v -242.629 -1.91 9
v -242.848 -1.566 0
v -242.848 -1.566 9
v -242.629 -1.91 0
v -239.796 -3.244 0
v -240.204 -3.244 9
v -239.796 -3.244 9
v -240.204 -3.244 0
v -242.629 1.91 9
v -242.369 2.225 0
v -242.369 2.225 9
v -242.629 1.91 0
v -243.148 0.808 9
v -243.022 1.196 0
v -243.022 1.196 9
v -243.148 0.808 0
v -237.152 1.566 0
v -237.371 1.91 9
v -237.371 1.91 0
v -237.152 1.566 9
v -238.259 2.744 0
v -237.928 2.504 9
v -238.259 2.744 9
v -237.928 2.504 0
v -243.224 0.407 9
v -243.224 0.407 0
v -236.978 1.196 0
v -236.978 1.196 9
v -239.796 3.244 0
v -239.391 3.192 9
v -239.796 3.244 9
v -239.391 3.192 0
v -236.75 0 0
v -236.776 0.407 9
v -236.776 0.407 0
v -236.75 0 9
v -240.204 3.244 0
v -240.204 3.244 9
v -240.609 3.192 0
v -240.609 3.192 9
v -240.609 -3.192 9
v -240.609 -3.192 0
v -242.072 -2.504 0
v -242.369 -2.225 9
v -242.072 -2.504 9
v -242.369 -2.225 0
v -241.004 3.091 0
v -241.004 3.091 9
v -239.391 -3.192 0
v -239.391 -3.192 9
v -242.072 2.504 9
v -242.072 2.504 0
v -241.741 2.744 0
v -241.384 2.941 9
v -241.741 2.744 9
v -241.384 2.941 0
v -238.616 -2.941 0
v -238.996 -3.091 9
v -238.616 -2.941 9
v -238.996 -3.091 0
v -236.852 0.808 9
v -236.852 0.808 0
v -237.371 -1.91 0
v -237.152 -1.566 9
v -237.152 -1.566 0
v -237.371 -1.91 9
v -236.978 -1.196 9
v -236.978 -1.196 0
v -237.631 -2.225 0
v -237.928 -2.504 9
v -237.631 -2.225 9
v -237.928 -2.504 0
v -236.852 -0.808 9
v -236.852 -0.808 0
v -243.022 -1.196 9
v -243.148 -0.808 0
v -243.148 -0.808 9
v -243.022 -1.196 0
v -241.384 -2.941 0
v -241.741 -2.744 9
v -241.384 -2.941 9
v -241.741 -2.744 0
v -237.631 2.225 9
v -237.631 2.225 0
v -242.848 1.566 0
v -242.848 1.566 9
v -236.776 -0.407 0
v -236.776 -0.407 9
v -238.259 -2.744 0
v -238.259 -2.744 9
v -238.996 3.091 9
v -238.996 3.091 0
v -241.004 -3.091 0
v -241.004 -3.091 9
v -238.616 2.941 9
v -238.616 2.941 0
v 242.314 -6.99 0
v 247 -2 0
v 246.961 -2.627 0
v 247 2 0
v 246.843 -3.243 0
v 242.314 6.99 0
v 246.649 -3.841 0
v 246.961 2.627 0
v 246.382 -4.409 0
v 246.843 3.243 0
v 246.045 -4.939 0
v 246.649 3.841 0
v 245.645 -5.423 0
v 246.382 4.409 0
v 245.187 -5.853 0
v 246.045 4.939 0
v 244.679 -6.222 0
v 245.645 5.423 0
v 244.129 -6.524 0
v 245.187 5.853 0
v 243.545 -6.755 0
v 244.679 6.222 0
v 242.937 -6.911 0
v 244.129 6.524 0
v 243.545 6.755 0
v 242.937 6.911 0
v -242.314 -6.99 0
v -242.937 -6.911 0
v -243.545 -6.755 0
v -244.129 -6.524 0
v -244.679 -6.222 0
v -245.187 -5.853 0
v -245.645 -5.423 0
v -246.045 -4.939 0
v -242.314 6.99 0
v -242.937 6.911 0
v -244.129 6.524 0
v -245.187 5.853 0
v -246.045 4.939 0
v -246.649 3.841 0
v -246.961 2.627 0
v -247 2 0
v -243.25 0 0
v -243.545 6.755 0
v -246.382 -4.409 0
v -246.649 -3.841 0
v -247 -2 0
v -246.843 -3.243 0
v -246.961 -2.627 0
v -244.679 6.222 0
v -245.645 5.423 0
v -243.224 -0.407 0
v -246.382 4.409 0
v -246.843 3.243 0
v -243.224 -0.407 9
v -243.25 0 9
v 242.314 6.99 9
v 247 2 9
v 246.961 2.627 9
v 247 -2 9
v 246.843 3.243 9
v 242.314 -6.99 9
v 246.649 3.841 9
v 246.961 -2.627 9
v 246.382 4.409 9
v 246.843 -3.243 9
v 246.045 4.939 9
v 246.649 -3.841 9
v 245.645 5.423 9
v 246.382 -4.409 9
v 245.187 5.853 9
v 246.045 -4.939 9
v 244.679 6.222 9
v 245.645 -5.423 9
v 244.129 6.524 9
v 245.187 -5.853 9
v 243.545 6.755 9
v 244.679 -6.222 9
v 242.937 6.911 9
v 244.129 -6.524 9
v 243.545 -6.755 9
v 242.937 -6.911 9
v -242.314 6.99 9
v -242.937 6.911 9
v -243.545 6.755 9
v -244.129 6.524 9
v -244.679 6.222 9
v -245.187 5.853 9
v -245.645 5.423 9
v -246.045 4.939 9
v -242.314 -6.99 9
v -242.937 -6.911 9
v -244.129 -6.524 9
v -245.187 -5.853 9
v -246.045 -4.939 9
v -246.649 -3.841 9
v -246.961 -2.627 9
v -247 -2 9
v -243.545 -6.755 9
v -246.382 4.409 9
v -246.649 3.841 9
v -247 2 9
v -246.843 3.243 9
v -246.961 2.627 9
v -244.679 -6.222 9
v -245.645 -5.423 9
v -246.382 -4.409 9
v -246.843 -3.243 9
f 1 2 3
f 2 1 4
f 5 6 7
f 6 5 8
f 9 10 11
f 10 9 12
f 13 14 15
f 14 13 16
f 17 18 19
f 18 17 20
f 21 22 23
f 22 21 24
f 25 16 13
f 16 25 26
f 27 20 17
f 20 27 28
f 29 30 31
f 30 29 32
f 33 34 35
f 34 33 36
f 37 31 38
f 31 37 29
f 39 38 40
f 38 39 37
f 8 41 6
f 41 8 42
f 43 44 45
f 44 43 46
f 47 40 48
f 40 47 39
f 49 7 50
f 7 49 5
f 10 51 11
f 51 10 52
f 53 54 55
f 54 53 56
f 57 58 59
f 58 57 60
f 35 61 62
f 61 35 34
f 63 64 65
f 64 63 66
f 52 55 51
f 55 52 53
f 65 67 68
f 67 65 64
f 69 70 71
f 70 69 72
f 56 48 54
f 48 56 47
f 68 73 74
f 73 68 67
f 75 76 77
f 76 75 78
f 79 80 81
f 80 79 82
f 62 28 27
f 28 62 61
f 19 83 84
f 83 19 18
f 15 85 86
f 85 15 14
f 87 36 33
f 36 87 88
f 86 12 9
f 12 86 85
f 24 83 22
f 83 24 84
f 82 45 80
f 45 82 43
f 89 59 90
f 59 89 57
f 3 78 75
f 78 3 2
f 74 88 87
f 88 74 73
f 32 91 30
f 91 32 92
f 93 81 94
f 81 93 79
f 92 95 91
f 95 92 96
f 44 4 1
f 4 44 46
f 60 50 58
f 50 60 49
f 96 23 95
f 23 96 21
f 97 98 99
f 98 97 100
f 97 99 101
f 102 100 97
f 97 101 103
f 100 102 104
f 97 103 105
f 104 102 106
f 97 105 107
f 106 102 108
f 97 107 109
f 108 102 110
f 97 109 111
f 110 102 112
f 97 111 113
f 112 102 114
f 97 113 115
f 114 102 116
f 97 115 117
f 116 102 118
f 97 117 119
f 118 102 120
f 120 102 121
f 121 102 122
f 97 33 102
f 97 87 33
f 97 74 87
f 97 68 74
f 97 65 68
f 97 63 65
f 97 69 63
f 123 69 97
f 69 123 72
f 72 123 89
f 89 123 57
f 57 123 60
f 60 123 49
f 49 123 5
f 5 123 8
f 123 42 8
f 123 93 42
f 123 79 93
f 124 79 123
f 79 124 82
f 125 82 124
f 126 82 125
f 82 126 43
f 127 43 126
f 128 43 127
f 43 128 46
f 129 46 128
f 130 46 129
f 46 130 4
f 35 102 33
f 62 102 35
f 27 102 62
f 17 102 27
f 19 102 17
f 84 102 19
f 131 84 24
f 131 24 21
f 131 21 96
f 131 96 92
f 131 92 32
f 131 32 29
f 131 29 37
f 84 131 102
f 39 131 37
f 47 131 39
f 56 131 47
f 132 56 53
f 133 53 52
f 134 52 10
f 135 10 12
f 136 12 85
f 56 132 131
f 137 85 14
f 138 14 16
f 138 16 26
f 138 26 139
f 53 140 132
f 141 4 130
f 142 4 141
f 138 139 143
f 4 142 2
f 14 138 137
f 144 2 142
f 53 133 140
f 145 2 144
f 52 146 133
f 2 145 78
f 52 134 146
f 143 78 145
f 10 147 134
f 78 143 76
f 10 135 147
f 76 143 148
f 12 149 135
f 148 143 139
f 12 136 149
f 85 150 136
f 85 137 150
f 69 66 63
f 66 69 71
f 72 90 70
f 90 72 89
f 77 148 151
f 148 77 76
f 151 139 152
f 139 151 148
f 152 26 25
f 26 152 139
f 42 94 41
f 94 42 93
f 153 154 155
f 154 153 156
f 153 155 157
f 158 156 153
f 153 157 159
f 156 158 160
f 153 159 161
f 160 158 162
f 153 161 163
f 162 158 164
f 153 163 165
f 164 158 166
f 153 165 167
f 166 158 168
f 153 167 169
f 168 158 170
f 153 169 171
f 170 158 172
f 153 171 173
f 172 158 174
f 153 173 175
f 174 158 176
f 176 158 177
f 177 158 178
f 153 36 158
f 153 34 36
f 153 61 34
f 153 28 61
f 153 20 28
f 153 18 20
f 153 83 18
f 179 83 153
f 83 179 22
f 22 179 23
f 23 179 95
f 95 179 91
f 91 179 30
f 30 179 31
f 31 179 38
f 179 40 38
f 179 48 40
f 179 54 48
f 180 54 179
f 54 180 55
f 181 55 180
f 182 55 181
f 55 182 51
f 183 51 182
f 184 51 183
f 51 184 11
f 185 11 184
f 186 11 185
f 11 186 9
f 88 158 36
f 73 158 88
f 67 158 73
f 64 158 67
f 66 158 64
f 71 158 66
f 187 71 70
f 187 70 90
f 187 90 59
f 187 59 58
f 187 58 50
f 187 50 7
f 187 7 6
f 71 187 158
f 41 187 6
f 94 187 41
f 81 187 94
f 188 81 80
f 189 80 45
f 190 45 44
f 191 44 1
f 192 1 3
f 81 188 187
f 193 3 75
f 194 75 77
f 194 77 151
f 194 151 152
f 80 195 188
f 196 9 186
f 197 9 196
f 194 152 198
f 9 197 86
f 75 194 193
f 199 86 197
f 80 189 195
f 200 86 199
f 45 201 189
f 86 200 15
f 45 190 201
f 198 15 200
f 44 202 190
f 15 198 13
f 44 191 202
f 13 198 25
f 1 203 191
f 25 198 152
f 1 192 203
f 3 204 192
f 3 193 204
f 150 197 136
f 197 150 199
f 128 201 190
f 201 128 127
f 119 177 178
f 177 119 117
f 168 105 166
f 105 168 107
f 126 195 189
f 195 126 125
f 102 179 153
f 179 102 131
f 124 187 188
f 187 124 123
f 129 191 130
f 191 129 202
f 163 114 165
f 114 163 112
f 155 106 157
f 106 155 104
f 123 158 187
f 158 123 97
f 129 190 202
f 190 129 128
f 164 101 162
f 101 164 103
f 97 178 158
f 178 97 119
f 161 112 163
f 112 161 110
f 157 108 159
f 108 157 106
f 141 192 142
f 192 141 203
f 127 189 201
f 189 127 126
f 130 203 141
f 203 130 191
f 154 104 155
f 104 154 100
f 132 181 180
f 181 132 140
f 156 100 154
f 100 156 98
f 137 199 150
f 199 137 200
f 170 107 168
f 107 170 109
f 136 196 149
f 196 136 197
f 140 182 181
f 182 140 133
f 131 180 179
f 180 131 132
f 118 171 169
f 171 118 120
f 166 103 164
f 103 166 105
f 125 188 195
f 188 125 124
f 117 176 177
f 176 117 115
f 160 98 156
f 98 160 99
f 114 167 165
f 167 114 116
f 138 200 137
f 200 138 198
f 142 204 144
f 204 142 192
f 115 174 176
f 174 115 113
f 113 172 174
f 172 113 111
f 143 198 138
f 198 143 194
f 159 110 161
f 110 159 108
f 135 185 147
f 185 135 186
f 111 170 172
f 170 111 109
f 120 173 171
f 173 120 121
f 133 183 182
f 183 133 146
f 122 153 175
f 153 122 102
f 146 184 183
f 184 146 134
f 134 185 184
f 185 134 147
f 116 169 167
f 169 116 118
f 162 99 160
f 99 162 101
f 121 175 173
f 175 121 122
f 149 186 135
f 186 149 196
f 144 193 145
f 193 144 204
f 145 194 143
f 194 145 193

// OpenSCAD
$fn = 50;


difference() {
	union() {
		hull() {
			translate(v = [-242.0000000000, 2.0000000000, 0]) {
				cylinder(h = 9, r = 5);
			}
			translate(v = [242.0000000000, 2.0000000000, 0]) {
				cylinder(h = 9, r = 5);
			}
			translate(v = [-242.0000000000, -2.0000000000, 0]) {
				cylinder(h = 9, r = 5);
			}
			translate(v = [242.0000000000, -2.0000000000, 0]) {
				cylinder(h = 9, r = 5);
			}
		}
	}
	union() {
		translate(v = [-240.0000000000, 0.0000000000, 0]) {
			cylinder(h = 9, r = 3.2500000000);
		}
		translate(v = [-240.0000000000, 0.0000000000, 0]) {
			cylinder(h = 9, r = 1.8000000000);
		}
		translate(v = [-240.0000000000, 0.0000000000, 0]) {
			cylinder(h = 9, r = 1.8000000000);
		}
		translate(v = [-240.0000000000, 0.0000000000, 0]) {
			cylinder(h = 9, r = 1.8000000000);
		}
	}
}
